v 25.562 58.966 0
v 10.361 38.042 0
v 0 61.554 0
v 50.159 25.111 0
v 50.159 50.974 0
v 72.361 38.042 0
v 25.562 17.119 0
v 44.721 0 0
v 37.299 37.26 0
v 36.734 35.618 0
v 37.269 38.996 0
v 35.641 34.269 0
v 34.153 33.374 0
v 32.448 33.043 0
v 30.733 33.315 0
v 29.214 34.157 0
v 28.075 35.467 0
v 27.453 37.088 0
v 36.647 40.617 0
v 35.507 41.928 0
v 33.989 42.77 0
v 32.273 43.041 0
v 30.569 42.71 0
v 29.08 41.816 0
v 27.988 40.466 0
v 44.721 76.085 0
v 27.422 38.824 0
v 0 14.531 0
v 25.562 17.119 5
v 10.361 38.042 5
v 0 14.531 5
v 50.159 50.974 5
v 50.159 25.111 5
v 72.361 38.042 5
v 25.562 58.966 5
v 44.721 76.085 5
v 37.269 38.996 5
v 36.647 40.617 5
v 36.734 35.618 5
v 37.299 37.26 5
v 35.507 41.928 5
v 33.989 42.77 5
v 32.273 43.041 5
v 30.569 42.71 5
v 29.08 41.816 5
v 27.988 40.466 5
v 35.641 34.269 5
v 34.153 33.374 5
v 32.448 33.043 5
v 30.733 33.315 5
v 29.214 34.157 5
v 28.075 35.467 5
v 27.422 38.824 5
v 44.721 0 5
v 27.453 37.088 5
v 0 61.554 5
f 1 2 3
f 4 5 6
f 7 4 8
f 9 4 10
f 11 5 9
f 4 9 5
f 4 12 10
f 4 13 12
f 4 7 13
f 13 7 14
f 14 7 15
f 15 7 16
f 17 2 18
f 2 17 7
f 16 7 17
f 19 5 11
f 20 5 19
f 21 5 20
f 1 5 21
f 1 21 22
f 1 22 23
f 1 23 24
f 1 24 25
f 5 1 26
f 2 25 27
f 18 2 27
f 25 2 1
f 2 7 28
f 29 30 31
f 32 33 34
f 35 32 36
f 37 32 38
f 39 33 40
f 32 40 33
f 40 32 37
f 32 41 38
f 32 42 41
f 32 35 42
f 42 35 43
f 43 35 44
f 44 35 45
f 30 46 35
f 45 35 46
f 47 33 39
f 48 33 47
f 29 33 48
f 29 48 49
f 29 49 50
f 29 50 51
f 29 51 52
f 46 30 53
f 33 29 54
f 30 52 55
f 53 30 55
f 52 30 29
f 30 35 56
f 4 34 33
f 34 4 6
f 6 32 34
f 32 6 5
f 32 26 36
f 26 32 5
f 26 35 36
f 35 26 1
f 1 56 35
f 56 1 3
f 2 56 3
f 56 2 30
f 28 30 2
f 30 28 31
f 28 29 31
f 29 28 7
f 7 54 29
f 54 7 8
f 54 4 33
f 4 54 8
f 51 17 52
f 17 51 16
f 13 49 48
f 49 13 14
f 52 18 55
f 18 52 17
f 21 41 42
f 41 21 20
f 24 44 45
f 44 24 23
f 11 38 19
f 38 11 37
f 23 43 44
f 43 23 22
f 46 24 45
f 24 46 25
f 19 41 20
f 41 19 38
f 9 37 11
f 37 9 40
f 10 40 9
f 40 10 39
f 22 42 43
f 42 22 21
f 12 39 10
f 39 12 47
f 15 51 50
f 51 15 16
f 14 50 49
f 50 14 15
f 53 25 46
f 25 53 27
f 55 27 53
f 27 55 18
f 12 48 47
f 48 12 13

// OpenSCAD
$fn = 32;

// ----------------------------------------------------------------------
// Star wheel: 5-point star, R40
// ----------------------------------------------------------------------

// --- parameters (mm) ---
n_points = 5;             // number of points / teeth
r_out = 40;               // tip radius
r_in = 22;                // root radius
bore_r = 5;               // centre bore radius
plate_t = 5;              // plate thickness, Z (extrusion height)
bore_d = 10;              // centre bore diameter
fit_tol = 0.05;           // declared fit tolerance (prompt contract)
free_tol = 0.2;           // declared free tolerance (prompt contract)

profile = [[72.361, 38.042], [50.159, 50.974], [44.721, 76.085], [25.562, 58.966], [0, 61.554], [10.361, 38.042], [0, 14.531], [25.562, 17.119], [44.721, 0], [50.159, 25.111]];  // primary outline, 10 points, counter clockwise
void_1 = [[37.269, 38.996], [36.647, 40.617], [35.507, 41.928], [33.989, 42.77], [32.273, 43.041], [30.569, 42.71], [29.08, 41.816], [27.988, 40.466], [27.422, 38.824], [27.453, 37.088], [28.075, 35.467], [29.214, 34.157], [30.733, 33.315], [32.448, 33.043], [34.153, 33.374], [35.641, 34.269], [36.734, 35.618], [37.299, 37.26]];  // centre bore, 18 points

// --- the one profile operation ---
difference() {
  linear_extrude(height = plate_t) polygon(points = profile);
  translate([0, 0, -1])
    linear_extrude(height = plate_t + 2) polygon(points = void_1);
}
